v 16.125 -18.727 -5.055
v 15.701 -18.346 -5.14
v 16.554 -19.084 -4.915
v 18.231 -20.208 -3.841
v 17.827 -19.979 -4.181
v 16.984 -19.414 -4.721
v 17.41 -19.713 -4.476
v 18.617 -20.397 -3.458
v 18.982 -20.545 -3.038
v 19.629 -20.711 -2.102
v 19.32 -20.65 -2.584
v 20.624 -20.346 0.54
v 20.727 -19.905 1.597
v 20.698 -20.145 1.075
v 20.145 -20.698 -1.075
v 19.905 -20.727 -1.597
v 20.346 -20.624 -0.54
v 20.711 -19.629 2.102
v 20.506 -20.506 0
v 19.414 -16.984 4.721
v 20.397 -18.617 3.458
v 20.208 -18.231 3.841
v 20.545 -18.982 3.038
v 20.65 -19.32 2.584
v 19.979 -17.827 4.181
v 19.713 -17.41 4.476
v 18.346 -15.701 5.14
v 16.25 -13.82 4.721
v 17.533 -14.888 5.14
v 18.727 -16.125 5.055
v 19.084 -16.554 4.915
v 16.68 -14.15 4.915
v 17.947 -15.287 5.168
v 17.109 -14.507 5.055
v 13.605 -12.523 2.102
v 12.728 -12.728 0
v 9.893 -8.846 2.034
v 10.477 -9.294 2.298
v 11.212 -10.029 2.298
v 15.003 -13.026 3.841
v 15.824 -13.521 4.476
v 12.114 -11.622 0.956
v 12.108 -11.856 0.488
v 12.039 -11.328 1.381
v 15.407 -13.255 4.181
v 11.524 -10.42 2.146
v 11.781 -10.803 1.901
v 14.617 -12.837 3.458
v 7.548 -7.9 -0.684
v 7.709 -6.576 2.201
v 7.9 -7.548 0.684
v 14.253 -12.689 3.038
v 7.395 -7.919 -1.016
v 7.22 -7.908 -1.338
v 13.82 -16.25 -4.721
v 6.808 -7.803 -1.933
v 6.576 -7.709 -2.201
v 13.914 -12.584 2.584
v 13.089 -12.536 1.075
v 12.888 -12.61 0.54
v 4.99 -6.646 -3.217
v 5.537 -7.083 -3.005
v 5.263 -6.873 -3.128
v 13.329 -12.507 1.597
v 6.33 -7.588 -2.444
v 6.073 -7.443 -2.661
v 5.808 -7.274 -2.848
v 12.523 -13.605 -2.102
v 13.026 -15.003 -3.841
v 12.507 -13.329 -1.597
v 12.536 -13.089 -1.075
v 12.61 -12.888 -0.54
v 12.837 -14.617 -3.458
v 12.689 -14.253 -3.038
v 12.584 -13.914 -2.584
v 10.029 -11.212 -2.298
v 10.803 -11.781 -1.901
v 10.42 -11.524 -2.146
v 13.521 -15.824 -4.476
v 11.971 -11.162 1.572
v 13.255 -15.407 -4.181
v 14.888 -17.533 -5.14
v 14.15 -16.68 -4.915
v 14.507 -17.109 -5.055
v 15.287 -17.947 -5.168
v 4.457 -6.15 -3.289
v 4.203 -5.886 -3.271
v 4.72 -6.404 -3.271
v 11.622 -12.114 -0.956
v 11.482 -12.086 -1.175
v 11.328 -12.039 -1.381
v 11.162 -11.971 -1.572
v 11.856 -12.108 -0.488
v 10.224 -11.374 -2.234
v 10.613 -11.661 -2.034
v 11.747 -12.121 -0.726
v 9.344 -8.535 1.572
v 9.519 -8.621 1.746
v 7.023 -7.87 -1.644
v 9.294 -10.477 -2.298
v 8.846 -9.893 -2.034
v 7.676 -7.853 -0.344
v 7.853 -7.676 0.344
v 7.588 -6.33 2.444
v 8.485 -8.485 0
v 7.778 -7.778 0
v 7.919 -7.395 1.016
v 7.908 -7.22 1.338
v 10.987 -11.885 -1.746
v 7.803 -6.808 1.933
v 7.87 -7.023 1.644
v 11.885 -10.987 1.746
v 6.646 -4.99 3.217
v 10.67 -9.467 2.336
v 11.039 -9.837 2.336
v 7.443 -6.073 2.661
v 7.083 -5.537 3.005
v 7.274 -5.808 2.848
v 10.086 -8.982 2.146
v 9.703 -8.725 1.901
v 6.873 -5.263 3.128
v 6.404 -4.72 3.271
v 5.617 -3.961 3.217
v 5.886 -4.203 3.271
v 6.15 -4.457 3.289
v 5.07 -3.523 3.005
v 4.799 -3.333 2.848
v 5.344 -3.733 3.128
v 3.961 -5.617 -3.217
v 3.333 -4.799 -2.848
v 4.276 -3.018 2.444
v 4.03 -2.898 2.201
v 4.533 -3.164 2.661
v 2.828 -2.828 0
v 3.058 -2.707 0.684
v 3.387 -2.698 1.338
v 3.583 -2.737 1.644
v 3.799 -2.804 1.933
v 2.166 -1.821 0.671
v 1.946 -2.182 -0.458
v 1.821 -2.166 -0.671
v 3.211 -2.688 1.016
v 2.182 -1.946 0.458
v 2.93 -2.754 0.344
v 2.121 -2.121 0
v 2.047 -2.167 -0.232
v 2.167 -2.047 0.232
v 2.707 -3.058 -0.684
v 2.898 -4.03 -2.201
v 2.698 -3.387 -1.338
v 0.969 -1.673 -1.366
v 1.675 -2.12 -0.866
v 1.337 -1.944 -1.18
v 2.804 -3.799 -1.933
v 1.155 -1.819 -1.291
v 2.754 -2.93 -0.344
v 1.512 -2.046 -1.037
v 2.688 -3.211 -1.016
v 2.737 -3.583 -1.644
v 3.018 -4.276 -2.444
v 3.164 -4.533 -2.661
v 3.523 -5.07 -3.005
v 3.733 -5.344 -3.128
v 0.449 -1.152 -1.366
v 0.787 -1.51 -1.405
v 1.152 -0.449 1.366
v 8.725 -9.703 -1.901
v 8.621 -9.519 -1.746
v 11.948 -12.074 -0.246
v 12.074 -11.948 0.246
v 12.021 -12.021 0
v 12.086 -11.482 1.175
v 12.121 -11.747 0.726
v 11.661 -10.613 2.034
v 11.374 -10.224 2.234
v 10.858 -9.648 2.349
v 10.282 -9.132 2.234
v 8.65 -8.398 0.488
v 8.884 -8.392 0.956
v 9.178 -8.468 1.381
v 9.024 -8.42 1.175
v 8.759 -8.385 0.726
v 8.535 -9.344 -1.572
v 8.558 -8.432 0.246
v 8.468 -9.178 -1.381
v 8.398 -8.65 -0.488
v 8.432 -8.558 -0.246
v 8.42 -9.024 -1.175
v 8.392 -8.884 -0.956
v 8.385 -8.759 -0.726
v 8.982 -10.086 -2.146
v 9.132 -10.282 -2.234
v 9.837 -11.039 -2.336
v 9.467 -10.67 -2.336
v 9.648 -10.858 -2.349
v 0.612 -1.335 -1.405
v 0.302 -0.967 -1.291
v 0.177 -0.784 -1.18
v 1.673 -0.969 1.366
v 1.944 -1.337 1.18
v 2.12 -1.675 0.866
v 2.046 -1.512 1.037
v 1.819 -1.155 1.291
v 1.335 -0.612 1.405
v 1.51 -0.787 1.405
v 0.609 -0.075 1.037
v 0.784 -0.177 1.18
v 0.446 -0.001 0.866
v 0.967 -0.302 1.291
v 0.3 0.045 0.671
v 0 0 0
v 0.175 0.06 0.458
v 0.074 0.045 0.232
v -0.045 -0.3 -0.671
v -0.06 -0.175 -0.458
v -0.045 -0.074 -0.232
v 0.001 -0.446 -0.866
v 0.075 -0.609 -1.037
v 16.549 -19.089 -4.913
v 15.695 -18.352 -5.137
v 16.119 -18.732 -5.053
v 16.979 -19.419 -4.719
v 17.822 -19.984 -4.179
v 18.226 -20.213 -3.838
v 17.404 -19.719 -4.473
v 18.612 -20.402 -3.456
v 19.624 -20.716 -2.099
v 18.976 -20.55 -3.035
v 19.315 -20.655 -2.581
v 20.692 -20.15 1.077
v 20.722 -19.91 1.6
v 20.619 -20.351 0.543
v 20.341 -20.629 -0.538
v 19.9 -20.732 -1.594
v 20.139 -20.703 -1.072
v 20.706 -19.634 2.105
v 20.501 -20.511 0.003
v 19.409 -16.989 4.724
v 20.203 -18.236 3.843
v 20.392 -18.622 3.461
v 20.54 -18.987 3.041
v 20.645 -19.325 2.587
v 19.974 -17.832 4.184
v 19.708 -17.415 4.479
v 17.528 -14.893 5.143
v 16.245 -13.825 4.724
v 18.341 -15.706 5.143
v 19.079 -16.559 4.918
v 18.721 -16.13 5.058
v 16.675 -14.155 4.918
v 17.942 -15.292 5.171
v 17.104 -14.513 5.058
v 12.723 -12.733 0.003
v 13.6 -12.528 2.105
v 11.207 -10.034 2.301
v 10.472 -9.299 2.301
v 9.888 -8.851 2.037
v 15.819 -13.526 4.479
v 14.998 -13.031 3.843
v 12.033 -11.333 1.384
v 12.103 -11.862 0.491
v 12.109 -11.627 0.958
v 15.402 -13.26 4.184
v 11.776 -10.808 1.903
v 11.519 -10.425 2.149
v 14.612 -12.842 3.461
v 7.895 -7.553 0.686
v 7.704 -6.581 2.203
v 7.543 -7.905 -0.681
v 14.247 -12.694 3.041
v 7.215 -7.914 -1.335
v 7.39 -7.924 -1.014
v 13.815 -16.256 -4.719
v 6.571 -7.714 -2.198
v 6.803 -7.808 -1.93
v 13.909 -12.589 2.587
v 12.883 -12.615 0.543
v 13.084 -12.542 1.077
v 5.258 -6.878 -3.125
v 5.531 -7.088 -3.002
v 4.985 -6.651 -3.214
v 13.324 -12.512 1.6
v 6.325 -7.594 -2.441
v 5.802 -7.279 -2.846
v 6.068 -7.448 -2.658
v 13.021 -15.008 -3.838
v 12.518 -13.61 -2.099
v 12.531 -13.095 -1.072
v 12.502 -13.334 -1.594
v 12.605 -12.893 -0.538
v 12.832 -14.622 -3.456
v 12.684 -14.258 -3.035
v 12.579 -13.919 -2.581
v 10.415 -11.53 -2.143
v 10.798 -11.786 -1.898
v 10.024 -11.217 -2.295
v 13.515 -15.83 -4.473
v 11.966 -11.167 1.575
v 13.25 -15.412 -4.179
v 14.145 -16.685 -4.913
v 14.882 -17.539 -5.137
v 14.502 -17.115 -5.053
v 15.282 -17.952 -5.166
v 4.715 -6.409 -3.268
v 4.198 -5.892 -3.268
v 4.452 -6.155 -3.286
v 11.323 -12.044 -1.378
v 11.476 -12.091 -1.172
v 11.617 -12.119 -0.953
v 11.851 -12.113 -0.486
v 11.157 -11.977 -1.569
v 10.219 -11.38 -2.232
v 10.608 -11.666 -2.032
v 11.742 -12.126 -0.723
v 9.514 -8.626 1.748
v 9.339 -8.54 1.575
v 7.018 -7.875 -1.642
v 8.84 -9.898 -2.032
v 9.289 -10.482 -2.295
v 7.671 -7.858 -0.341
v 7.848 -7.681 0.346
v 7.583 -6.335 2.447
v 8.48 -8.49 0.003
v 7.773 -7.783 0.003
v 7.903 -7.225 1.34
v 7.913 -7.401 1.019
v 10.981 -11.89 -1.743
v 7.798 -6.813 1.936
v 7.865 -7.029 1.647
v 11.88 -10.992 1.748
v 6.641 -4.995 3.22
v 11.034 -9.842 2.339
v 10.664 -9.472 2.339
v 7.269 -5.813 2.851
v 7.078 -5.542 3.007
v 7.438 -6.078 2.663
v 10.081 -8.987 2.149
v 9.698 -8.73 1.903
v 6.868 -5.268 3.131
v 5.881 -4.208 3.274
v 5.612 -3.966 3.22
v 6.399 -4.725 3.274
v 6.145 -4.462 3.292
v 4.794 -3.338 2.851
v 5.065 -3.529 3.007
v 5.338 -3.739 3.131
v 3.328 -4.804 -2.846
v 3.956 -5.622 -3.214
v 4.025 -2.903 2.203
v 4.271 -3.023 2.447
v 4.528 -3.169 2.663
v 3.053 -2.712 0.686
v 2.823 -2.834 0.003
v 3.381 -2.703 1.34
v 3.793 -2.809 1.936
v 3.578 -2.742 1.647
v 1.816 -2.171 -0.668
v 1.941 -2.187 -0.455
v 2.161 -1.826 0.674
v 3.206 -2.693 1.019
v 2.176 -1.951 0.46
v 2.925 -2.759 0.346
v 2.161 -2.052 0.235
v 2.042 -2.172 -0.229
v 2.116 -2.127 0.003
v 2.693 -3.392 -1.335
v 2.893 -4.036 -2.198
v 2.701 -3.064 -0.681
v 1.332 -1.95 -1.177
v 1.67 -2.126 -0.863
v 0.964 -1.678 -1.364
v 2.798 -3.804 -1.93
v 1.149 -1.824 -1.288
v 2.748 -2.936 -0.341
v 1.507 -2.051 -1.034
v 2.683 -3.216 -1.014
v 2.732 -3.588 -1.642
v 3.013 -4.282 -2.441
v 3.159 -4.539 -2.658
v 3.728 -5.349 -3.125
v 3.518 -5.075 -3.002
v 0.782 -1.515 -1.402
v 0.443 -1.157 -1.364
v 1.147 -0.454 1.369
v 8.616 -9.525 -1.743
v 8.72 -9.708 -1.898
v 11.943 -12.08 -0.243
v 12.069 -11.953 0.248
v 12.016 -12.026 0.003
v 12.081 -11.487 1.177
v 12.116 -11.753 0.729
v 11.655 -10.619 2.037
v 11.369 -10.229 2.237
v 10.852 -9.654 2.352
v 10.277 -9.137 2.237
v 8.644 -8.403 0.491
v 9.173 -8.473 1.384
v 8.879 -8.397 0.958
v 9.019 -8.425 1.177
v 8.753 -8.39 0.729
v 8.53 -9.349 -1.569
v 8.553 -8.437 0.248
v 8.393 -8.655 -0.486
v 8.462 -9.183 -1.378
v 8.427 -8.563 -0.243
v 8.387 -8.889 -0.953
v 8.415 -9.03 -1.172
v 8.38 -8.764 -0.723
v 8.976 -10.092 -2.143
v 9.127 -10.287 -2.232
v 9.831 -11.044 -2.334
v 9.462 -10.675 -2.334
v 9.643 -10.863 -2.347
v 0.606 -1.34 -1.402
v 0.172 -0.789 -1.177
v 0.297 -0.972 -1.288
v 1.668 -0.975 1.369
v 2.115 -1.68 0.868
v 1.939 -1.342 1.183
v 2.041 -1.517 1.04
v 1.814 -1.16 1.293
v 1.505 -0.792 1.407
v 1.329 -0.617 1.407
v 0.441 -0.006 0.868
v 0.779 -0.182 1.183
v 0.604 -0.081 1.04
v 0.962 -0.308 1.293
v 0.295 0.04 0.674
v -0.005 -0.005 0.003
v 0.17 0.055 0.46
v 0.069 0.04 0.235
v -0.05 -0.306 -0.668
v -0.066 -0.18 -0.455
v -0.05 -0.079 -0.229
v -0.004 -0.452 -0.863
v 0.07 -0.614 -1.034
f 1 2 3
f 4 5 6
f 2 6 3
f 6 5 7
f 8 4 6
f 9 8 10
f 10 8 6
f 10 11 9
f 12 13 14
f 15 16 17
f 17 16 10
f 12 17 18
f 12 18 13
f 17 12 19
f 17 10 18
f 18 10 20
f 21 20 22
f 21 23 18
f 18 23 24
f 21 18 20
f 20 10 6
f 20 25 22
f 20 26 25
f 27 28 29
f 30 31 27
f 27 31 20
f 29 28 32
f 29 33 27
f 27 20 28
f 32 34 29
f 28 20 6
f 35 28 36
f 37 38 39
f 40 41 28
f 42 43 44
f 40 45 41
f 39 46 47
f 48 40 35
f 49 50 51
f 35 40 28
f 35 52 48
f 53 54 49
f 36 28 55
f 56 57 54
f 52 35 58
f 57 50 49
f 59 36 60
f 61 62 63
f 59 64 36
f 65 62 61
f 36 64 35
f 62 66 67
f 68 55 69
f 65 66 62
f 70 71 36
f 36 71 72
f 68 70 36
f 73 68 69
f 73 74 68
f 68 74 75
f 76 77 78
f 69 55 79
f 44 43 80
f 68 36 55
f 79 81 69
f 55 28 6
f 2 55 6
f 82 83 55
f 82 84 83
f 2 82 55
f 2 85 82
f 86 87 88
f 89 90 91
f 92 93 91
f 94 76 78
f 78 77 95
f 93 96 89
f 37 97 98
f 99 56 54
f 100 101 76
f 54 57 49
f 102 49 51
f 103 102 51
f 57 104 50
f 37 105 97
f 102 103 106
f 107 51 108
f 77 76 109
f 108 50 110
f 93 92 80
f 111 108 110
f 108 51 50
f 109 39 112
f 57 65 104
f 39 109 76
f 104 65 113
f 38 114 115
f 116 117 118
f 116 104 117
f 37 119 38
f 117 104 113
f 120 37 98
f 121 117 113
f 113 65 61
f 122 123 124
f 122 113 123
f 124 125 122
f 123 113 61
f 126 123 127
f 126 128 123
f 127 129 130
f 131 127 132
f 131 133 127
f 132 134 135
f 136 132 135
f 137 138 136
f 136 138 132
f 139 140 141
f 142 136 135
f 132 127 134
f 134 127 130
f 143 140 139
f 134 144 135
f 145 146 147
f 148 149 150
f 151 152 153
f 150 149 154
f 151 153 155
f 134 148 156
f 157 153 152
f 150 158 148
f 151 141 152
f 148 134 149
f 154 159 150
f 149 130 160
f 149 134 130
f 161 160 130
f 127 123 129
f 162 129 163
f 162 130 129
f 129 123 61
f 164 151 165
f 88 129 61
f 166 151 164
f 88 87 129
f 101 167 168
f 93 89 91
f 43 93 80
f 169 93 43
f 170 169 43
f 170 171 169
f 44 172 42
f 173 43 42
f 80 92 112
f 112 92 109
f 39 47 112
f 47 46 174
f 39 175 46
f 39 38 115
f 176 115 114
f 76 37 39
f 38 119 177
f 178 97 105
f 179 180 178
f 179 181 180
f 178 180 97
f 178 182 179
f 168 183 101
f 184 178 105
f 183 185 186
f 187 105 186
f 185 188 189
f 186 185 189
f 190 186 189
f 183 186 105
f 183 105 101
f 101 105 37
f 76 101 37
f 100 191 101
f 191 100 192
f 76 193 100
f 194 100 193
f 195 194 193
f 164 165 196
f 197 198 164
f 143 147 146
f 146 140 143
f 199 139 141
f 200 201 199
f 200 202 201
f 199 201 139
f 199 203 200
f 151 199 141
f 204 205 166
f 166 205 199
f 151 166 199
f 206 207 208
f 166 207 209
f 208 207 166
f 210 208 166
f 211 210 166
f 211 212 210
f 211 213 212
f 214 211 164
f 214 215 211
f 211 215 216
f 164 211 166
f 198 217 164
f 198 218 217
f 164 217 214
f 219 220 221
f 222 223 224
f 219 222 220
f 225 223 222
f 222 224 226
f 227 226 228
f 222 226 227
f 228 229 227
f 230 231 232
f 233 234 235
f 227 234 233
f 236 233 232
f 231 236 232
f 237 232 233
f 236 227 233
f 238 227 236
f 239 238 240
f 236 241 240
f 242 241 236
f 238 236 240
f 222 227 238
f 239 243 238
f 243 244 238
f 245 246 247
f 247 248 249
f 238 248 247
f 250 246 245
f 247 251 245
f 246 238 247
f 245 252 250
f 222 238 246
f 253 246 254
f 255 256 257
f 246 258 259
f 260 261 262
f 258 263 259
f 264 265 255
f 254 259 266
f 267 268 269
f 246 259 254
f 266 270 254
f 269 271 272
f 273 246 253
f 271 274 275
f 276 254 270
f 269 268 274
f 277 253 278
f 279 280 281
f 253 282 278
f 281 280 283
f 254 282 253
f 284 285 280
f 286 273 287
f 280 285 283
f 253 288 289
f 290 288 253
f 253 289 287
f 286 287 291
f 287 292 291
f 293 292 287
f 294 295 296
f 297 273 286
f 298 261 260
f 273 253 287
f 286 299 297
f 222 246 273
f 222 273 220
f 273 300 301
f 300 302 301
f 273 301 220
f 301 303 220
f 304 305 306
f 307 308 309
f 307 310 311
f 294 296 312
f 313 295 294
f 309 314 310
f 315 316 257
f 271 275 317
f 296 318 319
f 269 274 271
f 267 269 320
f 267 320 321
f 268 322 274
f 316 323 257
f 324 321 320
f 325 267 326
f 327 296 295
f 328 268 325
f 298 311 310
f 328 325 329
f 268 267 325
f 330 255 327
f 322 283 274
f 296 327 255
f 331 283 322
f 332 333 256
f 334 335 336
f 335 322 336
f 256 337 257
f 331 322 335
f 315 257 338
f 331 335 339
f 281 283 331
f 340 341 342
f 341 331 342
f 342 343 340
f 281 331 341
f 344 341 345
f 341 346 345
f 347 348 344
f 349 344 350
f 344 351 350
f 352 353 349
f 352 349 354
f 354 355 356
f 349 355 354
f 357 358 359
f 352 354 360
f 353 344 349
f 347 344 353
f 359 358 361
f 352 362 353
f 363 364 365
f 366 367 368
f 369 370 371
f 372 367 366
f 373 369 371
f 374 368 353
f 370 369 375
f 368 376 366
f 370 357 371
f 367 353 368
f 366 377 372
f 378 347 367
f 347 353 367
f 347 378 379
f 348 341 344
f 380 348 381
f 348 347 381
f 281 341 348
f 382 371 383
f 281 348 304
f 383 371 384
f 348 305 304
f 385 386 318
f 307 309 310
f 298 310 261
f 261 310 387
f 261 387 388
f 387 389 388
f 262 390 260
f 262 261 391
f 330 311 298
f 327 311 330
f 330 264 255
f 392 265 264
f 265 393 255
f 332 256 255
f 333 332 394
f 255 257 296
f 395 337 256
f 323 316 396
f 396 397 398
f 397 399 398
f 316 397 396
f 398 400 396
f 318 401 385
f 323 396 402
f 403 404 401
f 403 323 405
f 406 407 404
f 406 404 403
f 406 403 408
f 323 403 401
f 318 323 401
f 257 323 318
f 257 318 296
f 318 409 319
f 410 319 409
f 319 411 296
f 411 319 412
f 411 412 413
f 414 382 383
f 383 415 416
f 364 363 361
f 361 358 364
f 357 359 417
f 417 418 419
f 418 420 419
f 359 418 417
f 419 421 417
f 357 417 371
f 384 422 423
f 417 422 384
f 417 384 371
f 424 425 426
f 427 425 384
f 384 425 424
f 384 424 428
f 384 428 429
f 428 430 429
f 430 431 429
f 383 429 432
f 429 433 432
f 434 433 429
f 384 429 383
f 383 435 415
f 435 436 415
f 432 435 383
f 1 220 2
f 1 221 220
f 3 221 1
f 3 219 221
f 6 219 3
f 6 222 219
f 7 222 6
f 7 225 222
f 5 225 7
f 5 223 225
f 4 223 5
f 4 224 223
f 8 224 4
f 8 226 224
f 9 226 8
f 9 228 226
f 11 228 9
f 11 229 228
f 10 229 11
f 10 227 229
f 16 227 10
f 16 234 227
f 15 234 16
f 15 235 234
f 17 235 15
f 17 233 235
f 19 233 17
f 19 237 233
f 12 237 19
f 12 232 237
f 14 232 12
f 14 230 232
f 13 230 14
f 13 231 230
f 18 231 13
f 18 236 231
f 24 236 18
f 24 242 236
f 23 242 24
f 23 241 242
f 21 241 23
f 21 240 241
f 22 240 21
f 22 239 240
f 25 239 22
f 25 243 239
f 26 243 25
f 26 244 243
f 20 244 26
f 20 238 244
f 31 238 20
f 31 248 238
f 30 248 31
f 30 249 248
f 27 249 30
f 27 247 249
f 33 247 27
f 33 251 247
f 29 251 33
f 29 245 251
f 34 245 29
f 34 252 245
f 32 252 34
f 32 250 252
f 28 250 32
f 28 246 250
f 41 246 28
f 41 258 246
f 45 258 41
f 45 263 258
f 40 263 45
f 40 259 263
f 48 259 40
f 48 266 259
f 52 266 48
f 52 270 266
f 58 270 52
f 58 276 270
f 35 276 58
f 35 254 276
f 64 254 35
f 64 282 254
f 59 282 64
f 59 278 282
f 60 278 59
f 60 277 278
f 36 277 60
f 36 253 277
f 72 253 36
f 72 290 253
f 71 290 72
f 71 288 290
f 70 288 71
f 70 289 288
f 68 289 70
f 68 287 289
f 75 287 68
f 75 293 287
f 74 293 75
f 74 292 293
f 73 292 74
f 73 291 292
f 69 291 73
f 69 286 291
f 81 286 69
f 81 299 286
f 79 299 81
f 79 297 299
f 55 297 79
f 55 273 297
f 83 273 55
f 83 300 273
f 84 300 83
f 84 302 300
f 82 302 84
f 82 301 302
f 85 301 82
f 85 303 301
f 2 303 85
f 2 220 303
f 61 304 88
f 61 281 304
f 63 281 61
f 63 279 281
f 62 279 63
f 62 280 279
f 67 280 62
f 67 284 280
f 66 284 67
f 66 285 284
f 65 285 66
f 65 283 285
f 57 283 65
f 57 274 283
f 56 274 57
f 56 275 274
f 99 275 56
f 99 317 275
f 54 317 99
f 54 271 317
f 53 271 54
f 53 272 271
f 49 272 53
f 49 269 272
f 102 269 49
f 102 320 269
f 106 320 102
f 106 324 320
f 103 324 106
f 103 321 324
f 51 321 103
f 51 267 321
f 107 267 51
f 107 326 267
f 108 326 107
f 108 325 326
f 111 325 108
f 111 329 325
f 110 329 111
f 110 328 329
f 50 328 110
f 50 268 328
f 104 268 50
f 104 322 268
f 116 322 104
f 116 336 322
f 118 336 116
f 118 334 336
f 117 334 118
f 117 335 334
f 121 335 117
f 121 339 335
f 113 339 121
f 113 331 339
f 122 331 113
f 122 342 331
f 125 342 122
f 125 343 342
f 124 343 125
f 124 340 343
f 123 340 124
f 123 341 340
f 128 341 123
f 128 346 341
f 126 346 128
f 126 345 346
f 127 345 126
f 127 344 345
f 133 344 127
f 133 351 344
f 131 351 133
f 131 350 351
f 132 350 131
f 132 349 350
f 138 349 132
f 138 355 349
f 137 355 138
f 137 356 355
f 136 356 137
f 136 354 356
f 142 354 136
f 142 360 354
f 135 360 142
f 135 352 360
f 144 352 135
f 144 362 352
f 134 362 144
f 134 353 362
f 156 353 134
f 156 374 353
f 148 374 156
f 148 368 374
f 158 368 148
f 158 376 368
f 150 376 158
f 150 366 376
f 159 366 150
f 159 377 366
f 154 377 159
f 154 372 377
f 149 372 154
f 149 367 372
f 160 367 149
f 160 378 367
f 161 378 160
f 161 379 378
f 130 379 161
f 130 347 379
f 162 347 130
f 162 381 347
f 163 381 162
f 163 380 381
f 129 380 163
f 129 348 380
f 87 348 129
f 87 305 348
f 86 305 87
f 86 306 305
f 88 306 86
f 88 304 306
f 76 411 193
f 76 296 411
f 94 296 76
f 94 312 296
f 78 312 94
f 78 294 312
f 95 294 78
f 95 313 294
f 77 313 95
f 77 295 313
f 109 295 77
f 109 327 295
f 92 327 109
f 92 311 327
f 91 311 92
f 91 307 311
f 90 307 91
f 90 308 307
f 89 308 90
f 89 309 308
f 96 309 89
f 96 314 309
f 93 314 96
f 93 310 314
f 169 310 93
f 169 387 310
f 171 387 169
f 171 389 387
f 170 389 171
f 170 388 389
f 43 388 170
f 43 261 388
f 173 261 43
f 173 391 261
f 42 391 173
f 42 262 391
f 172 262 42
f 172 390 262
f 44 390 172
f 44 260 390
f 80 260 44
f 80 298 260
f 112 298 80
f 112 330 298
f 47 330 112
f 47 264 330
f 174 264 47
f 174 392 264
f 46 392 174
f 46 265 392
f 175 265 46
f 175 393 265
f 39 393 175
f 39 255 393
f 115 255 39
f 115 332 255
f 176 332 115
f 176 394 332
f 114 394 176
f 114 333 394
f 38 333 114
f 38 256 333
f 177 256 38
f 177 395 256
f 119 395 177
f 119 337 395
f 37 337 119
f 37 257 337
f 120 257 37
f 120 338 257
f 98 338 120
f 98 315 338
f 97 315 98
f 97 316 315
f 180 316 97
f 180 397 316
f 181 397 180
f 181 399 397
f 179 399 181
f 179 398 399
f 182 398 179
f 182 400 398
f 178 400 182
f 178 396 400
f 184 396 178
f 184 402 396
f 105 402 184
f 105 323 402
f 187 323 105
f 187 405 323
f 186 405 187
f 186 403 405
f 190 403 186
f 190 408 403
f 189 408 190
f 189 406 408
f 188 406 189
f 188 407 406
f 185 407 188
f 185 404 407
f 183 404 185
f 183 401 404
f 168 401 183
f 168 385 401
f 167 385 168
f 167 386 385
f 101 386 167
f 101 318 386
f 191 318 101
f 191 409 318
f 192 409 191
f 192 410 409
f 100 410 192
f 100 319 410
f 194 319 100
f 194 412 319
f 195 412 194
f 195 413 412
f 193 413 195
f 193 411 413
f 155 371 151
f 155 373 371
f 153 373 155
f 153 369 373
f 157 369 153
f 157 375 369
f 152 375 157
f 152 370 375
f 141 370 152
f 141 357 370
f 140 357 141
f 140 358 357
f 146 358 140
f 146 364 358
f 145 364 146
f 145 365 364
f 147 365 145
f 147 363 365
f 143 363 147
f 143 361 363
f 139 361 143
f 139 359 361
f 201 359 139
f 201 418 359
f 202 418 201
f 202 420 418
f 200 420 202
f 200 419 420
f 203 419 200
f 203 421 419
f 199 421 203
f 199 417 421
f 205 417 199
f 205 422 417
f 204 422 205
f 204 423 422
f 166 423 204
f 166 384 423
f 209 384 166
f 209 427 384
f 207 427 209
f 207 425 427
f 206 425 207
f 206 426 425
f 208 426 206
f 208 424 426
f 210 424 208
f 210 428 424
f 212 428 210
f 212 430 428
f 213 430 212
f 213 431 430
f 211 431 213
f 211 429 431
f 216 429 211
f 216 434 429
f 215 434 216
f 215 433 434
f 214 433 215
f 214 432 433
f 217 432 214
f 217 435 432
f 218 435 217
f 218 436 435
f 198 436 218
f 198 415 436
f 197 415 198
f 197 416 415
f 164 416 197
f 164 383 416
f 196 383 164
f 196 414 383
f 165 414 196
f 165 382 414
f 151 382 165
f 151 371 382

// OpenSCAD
// file: ../utils/layout.scad
//
// NopSCADlib Copyright Chris Palmer 2018
// nop.head@gmail.com
// hydraraptor.blogspot.com
//
// This file is part of NopSCADlib.
//
// NopSCADlib is free software: you can redistribute it and/or modify it under the terms of the
// GNU General Public License as published by the Free Software Foundation, either version 3 of
// the License, or (at your option) any later version.
//
// NopSCADlib is distributed in the hope that it will be useful, but WITHOUT ANY WARRANTY;
// without even the implied warranty of MERCHANTABILITY or FITNESS FOR A PARTICULAR PURPOSE.
// See the GNU General Public License for more details.
//
// You should have received a copy of the GNU General Public License along with NopSCADlib.
// If not, see <https://www.gnu.org/licenses/>.
//

//
//! Layout objects in a line with equal gaps given a vector of their widths.
//
include <../global_defs.scad>

function layout_offset(widths, i, gap = 2) = //! Calculate the offset for the ```i```th item
    i == 0 ? widths[0] / 2
           : layout_offset(widths, i - 1, gap) + widths[i - 1] / 2 + gap + widths[i] / 2;

module layout(widths, gap = 2, no_offset = false) //! Layout children passing ```$i```
    translate([no_offset ? -widths[0] / 2 : 0, 0])
        for($i = [0 : len(widths) - 1])
            translate([layout_offset(widths, $i, gap), 0])
                children();
// file: ../global_defs.scad
//
// NopSCADlib Copyright Chris Palmer 2018
// nop.head@gmail.com
// hydraraptor.blogspot.com
//
// This file is part of NopSCADlib.
//
// NopSCADlib is free software: you can redistribute it and/or modify it under the terms of the
// GNU General Public License as published by the Free Software Foundation, either version 3 of
// the License, or (at your option) any later version.
//
// NopSCADlib is distributed in the hope that it will be useful, but WITHOUT ANY WARRANTY;
// without even the implied warranty of MERCHANTABILITY or FITNESS FOR A PARTICULAR PURPOSE.
// See the GNU General Public License for more details.
//
// You should have received a copy of the GNU General Public License along with NopSCADlib.
// If not, see <https://www.gnu.org/licenses/>.
//

//
// This file included directly or indirectly in every scad file.
//
// This scheme allows the following:
//  bom defaults to 0
//  Setting $bom on the command line or in the main file before including lib.scad overrides it everywhere.
//  Setting $bom after including lib overrides bom in the libs but not in the local file.
//  Setting $_bom in the local file overrides it in the local file but not in the libs.
//
//function is_undef(x) = x == undef;

$_bom           = is_undef($bom)             ? 0      : $bom;             // 0 no bom, 1 assemblies and stls, 2 vitamins as well
$exploded       = is_undef($explode)         ? 0      : $explode;         // 1 for exploded view
layer_height    = is_undef($layer_height)    ? 0.25   : $layer_height;    // layer heigth when printing
extrusion_width = is_undef($extrusion_width) ? 0.5    : $extrusion_width; // filament width when printing
nozzle          = is_undef($nozzle)          ? 0.45   : $nozzle;          // 3D printer nozzle
cnc_bit_r       = is_undef($cnc_bit_r)       ? 1.2    : $cnc_bit_r;       // miniumum tool radius when milling 2D objects
pp1_colour      = is_undef($pp1_colour)      ? "lime" : $pp1_colour;      // printed part colour 1
pp2_colour      = is_undef($pp2_colour)      ? "red"  : $pp2_colour;      // printed part colour 2
pp3_colour      = is_undef($pp3_colour)      ? "blue" : $pp3_colour;      // printed part colour 3
pp4_colour      = is_undef($pp4_colour)      ? "darkorange" : $pp4_colour;// printed part colour 4
show_rays       = is_undef($show_rays)       ? false  : $show_rays;       // show camera sight lines and light direction

// Minimum wall is about two filaments wide but we extrude it closer to get better bonding
squeezed_wall = $preview ? 2 * extrusion_width - layer_height * (1 - PI / 4)
                         : extrusion_width - layer_height / 2 + nozzle / 2 + extrusion_width / 2;

inf = 1e10;      // very big
eps = 1/128;     // small fudge factor to stop CSG barfing on coincident faces.
$fa = 6;
$fs = extrusion_width / 2;

function round_to_layer(z) = ceil(z / layer_height) * layer_height;
// Some additional named colors
grey20                          = [0.2, 0.2, 0.2];
grey30                          = [0.3, 0.3, 0.3];
grey40                          = [0.4, 0.4, 0.4];
grey50                          = [0.5, 0.5, 0.5];
grey60                          = [0.6, 0.6, 0.6];
grey70                          = [0.7, 0.7, 0.7];
grey80                          = [0.8, 0.8, 0.8];
grey90                          = [0.9, 0.9, 0.9];
brass                           = "gold";

/*
 * Enums
 */
//
// Screws
//
hs_cap    = 0;
hs_pan    = 1;
hs_cs     = 2;     // counter sunk
hs_hex    = 3;
hs_grub   = 4;     // pulley set screw
hs_cs_cap = 5;
hs_dome   = 6;
//
// Hot end descriptions
//
jhead   = 1;
e3d     = 2;
//
// Face enumeration
//
f_bottom = 0;
f_top    = 1;
f_left   = 2;
f_right  = 3;
f_front  = 4;
f_back   = 5;
// main file
//
// NopSCADlib Copyright Chris Palmer 2018
// nop.head@gmail.com
// hydraraptor.blogspot.com
//
// This file is part of NopSCADlib.
//
// NopSCADlib is free software: you can redistribute it and/or modify it under the terms of the
// GNU General Public License as published by the Free Software Foundation, either version 3 of
// the License, or (at your option) any later version.
//
// NopSCADlib is distributed in the hope that it will be useful, but WITHOUT ANY WARRANTY;
// without even the implied warranty of MERCHANTABILITY or FITNESS FOR A PARTICULAR PURPOSE.
// See the GNU General Public License for more details.
//
// You should have received a copy of the GNU General Public License along with NopSCADlib.
// If not, see <https://www.gnu.org/licenses/>.
//
include <../global_defs.scad>
use <../utils/layout.scad>

diams = [3, 7, 5, 11];

module layouts() {
    linear_extrude(height = eps)
        layout(diams, gap = 1)
            circle(d = diams[$i]);
}

rotate([70, 0, 315]) layouts();
